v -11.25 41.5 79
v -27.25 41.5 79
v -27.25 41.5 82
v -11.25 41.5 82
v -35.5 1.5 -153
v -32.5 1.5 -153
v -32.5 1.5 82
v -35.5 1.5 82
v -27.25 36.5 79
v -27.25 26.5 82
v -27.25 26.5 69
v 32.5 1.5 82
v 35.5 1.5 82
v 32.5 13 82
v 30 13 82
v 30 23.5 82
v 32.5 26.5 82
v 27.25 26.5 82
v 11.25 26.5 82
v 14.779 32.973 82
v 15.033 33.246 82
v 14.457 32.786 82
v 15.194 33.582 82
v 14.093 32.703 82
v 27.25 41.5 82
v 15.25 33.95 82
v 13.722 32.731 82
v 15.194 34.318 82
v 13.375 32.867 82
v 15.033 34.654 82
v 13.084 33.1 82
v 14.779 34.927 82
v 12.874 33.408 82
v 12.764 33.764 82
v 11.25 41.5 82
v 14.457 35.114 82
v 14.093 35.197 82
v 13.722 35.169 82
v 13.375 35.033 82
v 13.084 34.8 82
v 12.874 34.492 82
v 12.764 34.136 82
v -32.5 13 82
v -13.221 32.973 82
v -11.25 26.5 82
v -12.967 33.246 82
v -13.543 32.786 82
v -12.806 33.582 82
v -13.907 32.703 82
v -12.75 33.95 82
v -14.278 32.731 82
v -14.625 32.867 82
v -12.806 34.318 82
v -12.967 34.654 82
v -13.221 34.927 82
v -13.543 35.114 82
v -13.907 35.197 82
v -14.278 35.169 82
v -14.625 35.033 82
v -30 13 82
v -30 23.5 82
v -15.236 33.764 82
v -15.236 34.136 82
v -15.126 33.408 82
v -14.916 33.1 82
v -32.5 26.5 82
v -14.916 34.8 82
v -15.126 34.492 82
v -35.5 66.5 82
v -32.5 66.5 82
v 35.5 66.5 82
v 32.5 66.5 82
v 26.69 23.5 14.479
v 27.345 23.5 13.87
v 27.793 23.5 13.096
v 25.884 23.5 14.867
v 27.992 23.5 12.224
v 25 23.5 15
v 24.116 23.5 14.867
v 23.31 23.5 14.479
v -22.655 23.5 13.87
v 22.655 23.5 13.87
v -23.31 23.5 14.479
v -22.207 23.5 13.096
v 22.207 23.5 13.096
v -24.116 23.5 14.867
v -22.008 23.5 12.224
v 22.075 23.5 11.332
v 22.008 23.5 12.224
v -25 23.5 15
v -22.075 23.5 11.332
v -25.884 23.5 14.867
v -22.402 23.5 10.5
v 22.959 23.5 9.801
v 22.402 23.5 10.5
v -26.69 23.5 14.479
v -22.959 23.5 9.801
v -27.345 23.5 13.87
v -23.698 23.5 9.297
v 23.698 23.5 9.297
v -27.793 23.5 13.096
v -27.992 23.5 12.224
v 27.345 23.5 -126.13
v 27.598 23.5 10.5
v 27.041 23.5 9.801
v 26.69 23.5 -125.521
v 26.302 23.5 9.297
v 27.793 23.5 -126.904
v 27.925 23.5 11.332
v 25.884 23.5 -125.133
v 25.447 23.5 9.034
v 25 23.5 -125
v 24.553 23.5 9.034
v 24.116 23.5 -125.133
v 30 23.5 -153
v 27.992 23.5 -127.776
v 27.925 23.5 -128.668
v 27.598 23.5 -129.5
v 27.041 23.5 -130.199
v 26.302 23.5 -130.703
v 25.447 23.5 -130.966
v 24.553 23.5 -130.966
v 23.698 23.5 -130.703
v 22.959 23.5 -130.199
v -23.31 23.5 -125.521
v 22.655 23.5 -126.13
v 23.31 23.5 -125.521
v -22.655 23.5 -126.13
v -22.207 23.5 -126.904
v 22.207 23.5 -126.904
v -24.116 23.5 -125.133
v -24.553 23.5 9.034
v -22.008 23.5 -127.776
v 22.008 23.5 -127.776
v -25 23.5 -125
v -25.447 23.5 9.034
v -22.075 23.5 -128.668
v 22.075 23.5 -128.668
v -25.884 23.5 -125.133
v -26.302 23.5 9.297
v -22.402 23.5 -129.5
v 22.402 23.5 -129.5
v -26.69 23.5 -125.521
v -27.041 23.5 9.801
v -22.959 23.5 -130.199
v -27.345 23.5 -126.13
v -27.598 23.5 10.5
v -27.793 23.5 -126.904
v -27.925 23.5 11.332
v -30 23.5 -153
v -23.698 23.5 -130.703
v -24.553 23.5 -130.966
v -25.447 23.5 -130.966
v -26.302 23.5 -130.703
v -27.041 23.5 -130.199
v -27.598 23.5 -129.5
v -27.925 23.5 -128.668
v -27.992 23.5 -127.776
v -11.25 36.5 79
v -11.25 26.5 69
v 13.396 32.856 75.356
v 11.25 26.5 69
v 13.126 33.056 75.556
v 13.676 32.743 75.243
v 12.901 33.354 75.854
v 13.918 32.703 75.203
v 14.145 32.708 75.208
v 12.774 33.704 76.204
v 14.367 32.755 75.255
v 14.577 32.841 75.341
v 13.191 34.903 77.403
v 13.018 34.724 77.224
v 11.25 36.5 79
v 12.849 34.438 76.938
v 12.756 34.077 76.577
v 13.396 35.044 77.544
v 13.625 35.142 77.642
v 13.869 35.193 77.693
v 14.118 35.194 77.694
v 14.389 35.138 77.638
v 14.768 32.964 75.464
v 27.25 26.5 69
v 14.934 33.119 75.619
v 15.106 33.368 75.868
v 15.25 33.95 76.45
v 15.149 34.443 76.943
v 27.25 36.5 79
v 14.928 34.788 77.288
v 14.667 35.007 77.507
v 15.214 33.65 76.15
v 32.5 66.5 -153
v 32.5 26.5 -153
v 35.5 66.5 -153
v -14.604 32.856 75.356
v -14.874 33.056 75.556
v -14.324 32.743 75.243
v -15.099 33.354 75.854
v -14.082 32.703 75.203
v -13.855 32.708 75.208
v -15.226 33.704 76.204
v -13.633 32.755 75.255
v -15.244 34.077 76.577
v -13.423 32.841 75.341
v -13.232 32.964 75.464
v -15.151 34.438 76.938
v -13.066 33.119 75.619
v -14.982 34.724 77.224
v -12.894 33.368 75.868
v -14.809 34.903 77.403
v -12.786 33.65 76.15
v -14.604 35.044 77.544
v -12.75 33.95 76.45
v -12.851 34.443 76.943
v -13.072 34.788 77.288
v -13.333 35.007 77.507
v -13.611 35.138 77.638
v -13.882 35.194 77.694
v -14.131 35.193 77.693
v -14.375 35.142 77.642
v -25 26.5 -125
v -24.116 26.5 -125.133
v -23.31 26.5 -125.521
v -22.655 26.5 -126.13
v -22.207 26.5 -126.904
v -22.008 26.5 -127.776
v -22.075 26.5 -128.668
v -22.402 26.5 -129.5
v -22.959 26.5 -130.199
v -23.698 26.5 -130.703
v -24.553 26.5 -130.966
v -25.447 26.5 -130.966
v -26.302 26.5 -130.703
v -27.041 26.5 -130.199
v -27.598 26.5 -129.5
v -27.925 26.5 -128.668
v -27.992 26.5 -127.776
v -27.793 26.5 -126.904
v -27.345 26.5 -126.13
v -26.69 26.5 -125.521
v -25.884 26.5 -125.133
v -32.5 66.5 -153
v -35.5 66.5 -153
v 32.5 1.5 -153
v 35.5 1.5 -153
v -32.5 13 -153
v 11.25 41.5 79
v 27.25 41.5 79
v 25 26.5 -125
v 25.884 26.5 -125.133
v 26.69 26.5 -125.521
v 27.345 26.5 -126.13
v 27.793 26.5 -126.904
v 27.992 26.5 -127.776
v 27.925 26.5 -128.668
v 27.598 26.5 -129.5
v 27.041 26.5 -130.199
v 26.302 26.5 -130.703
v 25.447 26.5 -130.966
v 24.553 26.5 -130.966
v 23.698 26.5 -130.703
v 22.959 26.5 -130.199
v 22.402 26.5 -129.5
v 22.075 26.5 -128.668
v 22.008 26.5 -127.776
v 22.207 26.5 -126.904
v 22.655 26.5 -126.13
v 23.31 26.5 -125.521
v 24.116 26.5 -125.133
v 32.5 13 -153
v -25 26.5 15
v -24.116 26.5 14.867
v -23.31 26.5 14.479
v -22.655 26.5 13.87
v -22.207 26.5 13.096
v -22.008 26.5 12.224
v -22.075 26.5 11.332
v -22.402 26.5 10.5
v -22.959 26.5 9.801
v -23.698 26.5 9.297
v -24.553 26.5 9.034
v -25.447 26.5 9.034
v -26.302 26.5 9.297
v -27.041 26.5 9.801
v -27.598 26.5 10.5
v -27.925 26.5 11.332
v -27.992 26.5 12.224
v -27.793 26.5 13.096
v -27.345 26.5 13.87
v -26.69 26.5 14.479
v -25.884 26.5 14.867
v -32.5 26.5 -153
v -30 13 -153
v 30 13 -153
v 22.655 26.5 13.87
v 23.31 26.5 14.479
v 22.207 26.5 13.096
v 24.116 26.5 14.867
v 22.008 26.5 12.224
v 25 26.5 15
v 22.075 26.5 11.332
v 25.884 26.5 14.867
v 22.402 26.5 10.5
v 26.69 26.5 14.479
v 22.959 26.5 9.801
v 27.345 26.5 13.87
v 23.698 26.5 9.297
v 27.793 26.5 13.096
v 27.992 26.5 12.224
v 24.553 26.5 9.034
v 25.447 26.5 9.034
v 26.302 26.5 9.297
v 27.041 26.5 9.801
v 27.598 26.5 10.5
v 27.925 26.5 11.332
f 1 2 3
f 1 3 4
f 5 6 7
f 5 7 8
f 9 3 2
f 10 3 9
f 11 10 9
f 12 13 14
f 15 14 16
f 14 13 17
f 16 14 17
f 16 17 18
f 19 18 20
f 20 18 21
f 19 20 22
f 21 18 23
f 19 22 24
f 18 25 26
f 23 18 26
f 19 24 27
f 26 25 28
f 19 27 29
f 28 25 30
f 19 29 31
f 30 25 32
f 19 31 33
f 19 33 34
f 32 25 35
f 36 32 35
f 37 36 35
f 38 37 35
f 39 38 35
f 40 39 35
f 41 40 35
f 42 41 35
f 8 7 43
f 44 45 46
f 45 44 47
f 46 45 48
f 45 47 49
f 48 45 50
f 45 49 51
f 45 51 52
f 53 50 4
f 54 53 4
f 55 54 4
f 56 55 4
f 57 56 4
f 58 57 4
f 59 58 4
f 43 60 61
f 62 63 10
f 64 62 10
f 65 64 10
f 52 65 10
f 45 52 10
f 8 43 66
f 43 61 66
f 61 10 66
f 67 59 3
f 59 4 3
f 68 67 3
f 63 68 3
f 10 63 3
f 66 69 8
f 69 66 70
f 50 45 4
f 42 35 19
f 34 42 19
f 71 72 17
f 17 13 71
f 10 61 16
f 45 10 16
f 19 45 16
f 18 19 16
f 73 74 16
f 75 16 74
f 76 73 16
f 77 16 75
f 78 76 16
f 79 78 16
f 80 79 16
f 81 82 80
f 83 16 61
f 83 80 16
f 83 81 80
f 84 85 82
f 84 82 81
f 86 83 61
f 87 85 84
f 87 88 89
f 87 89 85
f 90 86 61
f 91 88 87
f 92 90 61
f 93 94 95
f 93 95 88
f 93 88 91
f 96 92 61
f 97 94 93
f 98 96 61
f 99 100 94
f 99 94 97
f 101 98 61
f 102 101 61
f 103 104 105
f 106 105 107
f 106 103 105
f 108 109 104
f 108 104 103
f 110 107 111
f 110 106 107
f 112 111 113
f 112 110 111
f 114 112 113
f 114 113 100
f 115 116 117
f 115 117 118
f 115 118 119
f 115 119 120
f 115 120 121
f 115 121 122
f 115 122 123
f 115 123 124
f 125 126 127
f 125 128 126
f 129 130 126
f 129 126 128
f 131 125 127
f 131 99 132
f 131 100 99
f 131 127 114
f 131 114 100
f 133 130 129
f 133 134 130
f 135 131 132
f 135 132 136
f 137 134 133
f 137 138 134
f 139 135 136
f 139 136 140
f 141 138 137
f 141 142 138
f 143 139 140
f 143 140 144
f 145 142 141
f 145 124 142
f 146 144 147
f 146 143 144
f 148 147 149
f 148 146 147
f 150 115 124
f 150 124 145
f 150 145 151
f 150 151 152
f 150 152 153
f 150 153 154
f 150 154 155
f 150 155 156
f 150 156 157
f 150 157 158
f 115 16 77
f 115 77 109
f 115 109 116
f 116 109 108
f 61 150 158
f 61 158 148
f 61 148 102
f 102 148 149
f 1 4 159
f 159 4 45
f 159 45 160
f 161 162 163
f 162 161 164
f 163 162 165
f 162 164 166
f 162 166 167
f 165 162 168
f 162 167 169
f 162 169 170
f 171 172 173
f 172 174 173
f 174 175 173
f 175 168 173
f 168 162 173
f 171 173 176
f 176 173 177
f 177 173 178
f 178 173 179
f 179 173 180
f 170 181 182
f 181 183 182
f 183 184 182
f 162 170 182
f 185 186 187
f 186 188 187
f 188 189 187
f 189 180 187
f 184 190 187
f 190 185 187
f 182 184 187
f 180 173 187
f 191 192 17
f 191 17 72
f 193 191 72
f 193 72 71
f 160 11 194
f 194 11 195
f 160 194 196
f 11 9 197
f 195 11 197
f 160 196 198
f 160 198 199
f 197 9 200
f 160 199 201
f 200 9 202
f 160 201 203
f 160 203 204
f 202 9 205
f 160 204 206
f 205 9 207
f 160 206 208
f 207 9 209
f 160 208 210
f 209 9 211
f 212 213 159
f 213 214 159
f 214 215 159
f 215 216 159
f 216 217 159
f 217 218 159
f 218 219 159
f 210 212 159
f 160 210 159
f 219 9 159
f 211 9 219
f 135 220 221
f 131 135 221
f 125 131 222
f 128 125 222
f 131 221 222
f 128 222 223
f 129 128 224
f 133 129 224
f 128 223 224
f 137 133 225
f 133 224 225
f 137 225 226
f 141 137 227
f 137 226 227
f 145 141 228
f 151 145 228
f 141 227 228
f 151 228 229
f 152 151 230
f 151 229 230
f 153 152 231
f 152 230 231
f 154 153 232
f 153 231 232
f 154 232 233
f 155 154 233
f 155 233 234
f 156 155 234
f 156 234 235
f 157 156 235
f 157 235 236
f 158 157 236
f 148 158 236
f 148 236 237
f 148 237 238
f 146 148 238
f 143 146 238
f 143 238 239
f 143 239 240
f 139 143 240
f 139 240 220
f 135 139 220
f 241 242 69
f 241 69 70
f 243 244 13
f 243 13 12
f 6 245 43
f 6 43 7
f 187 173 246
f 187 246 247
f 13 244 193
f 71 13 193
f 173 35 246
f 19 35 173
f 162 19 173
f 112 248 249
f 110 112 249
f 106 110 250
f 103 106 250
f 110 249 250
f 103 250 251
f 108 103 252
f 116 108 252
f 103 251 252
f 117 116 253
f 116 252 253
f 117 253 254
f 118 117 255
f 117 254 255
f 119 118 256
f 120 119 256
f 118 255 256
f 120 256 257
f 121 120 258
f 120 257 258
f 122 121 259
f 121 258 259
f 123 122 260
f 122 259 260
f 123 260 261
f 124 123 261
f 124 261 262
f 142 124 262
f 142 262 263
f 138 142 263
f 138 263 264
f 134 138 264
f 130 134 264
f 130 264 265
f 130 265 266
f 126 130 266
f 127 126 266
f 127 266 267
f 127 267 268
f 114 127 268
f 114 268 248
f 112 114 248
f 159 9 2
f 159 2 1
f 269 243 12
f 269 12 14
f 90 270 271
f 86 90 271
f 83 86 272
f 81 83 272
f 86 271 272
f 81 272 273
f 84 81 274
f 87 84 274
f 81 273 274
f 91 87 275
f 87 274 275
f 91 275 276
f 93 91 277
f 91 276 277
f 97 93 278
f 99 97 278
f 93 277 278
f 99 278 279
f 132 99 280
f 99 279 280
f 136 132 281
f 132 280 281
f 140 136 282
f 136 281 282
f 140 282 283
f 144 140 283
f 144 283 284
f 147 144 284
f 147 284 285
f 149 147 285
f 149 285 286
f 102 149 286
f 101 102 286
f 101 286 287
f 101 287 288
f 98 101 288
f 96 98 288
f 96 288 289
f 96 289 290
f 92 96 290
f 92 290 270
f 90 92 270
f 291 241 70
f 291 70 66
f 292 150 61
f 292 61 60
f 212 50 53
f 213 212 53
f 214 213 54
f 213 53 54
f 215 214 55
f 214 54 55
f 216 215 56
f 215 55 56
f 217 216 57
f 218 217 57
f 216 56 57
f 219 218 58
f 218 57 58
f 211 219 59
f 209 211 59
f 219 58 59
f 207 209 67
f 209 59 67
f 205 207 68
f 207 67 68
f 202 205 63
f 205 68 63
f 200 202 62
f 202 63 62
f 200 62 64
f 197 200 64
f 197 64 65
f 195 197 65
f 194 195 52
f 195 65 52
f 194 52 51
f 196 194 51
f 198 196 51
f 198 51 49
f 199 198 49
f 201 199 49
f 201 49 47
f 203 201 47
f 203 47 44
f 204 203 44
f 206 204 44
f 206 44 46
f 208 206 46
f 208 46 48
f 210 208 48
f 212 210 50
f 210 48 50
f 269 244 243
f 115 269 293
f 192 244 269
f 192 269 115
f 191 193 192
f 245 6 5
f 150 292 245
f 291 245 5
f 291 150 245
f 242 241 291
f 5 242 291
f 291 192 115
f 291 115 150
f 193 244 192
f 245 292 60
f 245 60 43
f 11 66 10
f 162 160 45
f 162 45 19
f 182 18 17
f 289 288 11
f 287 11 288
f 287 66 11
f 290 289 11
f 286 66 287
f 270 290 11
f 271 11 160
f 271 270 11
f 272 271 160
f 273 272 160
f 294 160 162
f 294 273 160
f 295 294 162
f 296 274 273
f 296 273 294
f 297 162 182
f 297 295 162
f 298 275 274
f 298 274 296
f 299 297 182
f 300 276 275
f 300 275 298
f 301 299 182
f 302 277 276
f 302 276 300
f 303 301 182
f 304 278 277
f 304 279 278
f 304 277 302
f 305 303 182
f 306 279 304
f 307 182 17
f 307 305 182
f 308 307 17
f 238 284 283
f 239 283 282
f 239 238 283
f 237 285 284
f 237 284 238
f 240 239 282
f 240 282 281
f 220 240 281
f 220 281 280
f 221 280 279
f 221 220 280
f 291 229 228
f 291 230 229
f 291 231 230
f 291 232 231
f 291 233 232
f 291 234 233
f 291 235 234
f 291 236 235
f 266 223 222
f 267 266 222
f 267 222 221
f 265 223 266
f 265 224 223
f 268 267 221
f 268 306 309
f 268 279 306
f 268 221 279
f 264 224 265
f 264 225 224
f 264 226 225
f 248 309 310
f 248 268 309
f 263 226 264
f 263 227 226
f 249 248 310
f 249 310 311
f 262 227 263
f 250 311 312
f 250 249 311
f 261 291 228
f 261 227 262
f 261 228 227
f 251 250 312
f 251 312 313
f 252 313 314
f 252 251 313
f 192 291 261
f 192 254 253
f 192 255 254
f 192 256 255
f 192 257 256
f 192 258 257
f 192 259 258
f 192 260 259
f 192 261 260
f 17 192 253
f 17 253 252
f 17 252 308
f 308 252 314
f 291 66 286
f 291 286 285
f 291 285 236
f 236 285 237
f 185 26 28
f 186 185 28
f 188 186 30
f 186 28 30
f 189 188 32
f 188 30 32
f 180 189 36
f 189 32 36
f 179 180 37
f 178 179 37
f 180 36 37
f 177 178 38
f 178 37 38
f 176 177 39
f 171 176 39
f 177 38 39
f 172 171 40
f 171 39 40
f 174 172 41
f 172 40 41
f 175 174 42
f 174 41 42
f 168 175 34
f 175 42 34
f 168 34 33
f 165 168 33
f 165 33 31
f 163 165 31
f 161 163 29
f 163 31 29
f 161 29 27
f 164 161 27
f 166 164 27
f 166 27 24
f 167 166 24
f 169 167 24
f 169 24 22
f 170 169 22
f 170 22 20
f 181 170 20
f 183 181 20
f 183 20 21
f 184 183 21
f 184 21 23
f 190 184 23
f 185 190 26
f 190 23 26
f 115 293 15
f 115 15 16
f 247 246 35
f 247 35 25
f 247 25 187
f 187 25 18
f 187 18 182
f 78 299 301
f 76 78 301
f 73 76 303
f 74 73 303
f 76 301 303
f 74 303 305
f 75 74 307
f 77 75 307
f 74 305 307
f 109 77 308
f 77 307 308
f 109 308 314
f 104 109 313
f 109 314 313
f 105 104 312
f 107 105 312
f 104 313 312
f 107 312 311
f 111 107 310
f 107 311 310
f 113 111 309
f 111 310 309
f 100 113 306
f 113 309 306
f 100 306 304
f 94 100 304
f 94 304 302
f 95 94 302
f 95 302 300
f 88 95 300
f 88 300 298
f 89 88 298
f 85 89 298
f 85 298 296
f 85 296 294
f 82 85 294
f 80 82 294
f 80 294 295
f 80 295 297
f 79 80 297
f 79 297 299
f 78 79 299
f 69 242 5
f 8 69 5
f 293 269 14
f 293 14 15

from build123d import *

# Parameters (mm, degrees)
BOSS_EXTRUDE1_DEPTH      = 82
BOSS_EXTRUDE1_DEPTH_BACK = 153
SKETCH3_W                = 16
SKETCH3_H                = 3
BOSS_EXTRUDE3_DEPTH      = 15
CHAMFER1_SIZE            = 10
SKETCH4_R                = 1.25
CUT_EXTRUDE1_DEPTH       = 10
SKETCH2_R                = 3
CUT_EXTRUDE2_DEPTH       = 10


with BuildPart() as part:
    # Sketch1 → Boss-Extrude1 (new, two sides: drawn at the far end of the back side and taken through both)
    with BuildSketch(Plane.XY.offset(-BOSS_EXTRUDE1_DEPTH_BACK)):
        Polygon((-32.5, 13), (-32.5, 1.5), (-35.5, 1.5), (-35.5, 26.5), (-35.5, 66.5), (-32.5, 66.5), (-32.5, 26.5), (32.5, 26.5), (32.5, 66.5), (35.5, 66.5), (35.5, 26.5), (35.5, 1.5), (32.5, 1.5), (32.5, 13), (30, 13), (30, 23.5), (-30, 23.5), (-30, 13), align=None)
    extrude(amount=BOSS_EXTRUDE1_DEPTH + BOSS_EXTRUDE1_DEPTH_BACK)

    # Sketch3 → Boss-Extrude3 (add)
    with BuildSketch(Plane(origin=(0, 26.5, 0), x_dir=(1, 0, 0), z_dir=(0, 1, 0))):
        with Locations((-19.25, -80.5)):
            Rectangle(SKETCH3_W, SKETCH3_H)
        with Locations((19.25, -80.5)):
            Rectangle(SKETCH3_W, SKETCH3_H)
    extrude(amount=BOSS_EXTRUDE3_DEPTH)

    # Chamfer1
    chamfer1_edges = [part.edges().sort_by_distance(p)[0] for p in [
        (-19.25, 26.5, 79),
        (19.25, 26.5, 79),
    ]]
    chamfer(chamfer1_edges, length=CHAMFER1_SIZE)

    # Sketch4 → Cut-Extrude1 (cut)
    with BuildSketch(Plane.XY.offset(82)):
        with Locations((-14, 33.95)):
            Circle(SKETCH4_R)
        with Locations((14, 33.95)):
            Circle(SKETCH4_R)
    extrude(amount=-CUT_EXTRUDE1_DEPTH, mode=Mode.SUBTRACT)

    # Sketch2 → Cut-Extrude2 (cut)
    with BuildSketch(Plane(origin=(0, 26.5, 0), x_dir=(1, 0, 0), z_dir=(0, 1, 0))):
        with Locations(Location((-25, 128, 0), (0, 0, 270))):
            Circle(SKETCH2_R)
        with Locations(Location((25, 128, 0), (0, 0, 270))):
            Circle(SKETCH2_R)
        with Locations(Location((25, -12, 0), (0, 0, 270))):
            Circle(SKETCH2_R)
        with Locations(Location((-25, -12, 0), (0, 0, 270))):
            Circle(SKETCH2_R)
    extrude(amount=-CUT_EXTRUDE2_DEPTH, mode=Mode.SUBTRACT)


solid = part.part
